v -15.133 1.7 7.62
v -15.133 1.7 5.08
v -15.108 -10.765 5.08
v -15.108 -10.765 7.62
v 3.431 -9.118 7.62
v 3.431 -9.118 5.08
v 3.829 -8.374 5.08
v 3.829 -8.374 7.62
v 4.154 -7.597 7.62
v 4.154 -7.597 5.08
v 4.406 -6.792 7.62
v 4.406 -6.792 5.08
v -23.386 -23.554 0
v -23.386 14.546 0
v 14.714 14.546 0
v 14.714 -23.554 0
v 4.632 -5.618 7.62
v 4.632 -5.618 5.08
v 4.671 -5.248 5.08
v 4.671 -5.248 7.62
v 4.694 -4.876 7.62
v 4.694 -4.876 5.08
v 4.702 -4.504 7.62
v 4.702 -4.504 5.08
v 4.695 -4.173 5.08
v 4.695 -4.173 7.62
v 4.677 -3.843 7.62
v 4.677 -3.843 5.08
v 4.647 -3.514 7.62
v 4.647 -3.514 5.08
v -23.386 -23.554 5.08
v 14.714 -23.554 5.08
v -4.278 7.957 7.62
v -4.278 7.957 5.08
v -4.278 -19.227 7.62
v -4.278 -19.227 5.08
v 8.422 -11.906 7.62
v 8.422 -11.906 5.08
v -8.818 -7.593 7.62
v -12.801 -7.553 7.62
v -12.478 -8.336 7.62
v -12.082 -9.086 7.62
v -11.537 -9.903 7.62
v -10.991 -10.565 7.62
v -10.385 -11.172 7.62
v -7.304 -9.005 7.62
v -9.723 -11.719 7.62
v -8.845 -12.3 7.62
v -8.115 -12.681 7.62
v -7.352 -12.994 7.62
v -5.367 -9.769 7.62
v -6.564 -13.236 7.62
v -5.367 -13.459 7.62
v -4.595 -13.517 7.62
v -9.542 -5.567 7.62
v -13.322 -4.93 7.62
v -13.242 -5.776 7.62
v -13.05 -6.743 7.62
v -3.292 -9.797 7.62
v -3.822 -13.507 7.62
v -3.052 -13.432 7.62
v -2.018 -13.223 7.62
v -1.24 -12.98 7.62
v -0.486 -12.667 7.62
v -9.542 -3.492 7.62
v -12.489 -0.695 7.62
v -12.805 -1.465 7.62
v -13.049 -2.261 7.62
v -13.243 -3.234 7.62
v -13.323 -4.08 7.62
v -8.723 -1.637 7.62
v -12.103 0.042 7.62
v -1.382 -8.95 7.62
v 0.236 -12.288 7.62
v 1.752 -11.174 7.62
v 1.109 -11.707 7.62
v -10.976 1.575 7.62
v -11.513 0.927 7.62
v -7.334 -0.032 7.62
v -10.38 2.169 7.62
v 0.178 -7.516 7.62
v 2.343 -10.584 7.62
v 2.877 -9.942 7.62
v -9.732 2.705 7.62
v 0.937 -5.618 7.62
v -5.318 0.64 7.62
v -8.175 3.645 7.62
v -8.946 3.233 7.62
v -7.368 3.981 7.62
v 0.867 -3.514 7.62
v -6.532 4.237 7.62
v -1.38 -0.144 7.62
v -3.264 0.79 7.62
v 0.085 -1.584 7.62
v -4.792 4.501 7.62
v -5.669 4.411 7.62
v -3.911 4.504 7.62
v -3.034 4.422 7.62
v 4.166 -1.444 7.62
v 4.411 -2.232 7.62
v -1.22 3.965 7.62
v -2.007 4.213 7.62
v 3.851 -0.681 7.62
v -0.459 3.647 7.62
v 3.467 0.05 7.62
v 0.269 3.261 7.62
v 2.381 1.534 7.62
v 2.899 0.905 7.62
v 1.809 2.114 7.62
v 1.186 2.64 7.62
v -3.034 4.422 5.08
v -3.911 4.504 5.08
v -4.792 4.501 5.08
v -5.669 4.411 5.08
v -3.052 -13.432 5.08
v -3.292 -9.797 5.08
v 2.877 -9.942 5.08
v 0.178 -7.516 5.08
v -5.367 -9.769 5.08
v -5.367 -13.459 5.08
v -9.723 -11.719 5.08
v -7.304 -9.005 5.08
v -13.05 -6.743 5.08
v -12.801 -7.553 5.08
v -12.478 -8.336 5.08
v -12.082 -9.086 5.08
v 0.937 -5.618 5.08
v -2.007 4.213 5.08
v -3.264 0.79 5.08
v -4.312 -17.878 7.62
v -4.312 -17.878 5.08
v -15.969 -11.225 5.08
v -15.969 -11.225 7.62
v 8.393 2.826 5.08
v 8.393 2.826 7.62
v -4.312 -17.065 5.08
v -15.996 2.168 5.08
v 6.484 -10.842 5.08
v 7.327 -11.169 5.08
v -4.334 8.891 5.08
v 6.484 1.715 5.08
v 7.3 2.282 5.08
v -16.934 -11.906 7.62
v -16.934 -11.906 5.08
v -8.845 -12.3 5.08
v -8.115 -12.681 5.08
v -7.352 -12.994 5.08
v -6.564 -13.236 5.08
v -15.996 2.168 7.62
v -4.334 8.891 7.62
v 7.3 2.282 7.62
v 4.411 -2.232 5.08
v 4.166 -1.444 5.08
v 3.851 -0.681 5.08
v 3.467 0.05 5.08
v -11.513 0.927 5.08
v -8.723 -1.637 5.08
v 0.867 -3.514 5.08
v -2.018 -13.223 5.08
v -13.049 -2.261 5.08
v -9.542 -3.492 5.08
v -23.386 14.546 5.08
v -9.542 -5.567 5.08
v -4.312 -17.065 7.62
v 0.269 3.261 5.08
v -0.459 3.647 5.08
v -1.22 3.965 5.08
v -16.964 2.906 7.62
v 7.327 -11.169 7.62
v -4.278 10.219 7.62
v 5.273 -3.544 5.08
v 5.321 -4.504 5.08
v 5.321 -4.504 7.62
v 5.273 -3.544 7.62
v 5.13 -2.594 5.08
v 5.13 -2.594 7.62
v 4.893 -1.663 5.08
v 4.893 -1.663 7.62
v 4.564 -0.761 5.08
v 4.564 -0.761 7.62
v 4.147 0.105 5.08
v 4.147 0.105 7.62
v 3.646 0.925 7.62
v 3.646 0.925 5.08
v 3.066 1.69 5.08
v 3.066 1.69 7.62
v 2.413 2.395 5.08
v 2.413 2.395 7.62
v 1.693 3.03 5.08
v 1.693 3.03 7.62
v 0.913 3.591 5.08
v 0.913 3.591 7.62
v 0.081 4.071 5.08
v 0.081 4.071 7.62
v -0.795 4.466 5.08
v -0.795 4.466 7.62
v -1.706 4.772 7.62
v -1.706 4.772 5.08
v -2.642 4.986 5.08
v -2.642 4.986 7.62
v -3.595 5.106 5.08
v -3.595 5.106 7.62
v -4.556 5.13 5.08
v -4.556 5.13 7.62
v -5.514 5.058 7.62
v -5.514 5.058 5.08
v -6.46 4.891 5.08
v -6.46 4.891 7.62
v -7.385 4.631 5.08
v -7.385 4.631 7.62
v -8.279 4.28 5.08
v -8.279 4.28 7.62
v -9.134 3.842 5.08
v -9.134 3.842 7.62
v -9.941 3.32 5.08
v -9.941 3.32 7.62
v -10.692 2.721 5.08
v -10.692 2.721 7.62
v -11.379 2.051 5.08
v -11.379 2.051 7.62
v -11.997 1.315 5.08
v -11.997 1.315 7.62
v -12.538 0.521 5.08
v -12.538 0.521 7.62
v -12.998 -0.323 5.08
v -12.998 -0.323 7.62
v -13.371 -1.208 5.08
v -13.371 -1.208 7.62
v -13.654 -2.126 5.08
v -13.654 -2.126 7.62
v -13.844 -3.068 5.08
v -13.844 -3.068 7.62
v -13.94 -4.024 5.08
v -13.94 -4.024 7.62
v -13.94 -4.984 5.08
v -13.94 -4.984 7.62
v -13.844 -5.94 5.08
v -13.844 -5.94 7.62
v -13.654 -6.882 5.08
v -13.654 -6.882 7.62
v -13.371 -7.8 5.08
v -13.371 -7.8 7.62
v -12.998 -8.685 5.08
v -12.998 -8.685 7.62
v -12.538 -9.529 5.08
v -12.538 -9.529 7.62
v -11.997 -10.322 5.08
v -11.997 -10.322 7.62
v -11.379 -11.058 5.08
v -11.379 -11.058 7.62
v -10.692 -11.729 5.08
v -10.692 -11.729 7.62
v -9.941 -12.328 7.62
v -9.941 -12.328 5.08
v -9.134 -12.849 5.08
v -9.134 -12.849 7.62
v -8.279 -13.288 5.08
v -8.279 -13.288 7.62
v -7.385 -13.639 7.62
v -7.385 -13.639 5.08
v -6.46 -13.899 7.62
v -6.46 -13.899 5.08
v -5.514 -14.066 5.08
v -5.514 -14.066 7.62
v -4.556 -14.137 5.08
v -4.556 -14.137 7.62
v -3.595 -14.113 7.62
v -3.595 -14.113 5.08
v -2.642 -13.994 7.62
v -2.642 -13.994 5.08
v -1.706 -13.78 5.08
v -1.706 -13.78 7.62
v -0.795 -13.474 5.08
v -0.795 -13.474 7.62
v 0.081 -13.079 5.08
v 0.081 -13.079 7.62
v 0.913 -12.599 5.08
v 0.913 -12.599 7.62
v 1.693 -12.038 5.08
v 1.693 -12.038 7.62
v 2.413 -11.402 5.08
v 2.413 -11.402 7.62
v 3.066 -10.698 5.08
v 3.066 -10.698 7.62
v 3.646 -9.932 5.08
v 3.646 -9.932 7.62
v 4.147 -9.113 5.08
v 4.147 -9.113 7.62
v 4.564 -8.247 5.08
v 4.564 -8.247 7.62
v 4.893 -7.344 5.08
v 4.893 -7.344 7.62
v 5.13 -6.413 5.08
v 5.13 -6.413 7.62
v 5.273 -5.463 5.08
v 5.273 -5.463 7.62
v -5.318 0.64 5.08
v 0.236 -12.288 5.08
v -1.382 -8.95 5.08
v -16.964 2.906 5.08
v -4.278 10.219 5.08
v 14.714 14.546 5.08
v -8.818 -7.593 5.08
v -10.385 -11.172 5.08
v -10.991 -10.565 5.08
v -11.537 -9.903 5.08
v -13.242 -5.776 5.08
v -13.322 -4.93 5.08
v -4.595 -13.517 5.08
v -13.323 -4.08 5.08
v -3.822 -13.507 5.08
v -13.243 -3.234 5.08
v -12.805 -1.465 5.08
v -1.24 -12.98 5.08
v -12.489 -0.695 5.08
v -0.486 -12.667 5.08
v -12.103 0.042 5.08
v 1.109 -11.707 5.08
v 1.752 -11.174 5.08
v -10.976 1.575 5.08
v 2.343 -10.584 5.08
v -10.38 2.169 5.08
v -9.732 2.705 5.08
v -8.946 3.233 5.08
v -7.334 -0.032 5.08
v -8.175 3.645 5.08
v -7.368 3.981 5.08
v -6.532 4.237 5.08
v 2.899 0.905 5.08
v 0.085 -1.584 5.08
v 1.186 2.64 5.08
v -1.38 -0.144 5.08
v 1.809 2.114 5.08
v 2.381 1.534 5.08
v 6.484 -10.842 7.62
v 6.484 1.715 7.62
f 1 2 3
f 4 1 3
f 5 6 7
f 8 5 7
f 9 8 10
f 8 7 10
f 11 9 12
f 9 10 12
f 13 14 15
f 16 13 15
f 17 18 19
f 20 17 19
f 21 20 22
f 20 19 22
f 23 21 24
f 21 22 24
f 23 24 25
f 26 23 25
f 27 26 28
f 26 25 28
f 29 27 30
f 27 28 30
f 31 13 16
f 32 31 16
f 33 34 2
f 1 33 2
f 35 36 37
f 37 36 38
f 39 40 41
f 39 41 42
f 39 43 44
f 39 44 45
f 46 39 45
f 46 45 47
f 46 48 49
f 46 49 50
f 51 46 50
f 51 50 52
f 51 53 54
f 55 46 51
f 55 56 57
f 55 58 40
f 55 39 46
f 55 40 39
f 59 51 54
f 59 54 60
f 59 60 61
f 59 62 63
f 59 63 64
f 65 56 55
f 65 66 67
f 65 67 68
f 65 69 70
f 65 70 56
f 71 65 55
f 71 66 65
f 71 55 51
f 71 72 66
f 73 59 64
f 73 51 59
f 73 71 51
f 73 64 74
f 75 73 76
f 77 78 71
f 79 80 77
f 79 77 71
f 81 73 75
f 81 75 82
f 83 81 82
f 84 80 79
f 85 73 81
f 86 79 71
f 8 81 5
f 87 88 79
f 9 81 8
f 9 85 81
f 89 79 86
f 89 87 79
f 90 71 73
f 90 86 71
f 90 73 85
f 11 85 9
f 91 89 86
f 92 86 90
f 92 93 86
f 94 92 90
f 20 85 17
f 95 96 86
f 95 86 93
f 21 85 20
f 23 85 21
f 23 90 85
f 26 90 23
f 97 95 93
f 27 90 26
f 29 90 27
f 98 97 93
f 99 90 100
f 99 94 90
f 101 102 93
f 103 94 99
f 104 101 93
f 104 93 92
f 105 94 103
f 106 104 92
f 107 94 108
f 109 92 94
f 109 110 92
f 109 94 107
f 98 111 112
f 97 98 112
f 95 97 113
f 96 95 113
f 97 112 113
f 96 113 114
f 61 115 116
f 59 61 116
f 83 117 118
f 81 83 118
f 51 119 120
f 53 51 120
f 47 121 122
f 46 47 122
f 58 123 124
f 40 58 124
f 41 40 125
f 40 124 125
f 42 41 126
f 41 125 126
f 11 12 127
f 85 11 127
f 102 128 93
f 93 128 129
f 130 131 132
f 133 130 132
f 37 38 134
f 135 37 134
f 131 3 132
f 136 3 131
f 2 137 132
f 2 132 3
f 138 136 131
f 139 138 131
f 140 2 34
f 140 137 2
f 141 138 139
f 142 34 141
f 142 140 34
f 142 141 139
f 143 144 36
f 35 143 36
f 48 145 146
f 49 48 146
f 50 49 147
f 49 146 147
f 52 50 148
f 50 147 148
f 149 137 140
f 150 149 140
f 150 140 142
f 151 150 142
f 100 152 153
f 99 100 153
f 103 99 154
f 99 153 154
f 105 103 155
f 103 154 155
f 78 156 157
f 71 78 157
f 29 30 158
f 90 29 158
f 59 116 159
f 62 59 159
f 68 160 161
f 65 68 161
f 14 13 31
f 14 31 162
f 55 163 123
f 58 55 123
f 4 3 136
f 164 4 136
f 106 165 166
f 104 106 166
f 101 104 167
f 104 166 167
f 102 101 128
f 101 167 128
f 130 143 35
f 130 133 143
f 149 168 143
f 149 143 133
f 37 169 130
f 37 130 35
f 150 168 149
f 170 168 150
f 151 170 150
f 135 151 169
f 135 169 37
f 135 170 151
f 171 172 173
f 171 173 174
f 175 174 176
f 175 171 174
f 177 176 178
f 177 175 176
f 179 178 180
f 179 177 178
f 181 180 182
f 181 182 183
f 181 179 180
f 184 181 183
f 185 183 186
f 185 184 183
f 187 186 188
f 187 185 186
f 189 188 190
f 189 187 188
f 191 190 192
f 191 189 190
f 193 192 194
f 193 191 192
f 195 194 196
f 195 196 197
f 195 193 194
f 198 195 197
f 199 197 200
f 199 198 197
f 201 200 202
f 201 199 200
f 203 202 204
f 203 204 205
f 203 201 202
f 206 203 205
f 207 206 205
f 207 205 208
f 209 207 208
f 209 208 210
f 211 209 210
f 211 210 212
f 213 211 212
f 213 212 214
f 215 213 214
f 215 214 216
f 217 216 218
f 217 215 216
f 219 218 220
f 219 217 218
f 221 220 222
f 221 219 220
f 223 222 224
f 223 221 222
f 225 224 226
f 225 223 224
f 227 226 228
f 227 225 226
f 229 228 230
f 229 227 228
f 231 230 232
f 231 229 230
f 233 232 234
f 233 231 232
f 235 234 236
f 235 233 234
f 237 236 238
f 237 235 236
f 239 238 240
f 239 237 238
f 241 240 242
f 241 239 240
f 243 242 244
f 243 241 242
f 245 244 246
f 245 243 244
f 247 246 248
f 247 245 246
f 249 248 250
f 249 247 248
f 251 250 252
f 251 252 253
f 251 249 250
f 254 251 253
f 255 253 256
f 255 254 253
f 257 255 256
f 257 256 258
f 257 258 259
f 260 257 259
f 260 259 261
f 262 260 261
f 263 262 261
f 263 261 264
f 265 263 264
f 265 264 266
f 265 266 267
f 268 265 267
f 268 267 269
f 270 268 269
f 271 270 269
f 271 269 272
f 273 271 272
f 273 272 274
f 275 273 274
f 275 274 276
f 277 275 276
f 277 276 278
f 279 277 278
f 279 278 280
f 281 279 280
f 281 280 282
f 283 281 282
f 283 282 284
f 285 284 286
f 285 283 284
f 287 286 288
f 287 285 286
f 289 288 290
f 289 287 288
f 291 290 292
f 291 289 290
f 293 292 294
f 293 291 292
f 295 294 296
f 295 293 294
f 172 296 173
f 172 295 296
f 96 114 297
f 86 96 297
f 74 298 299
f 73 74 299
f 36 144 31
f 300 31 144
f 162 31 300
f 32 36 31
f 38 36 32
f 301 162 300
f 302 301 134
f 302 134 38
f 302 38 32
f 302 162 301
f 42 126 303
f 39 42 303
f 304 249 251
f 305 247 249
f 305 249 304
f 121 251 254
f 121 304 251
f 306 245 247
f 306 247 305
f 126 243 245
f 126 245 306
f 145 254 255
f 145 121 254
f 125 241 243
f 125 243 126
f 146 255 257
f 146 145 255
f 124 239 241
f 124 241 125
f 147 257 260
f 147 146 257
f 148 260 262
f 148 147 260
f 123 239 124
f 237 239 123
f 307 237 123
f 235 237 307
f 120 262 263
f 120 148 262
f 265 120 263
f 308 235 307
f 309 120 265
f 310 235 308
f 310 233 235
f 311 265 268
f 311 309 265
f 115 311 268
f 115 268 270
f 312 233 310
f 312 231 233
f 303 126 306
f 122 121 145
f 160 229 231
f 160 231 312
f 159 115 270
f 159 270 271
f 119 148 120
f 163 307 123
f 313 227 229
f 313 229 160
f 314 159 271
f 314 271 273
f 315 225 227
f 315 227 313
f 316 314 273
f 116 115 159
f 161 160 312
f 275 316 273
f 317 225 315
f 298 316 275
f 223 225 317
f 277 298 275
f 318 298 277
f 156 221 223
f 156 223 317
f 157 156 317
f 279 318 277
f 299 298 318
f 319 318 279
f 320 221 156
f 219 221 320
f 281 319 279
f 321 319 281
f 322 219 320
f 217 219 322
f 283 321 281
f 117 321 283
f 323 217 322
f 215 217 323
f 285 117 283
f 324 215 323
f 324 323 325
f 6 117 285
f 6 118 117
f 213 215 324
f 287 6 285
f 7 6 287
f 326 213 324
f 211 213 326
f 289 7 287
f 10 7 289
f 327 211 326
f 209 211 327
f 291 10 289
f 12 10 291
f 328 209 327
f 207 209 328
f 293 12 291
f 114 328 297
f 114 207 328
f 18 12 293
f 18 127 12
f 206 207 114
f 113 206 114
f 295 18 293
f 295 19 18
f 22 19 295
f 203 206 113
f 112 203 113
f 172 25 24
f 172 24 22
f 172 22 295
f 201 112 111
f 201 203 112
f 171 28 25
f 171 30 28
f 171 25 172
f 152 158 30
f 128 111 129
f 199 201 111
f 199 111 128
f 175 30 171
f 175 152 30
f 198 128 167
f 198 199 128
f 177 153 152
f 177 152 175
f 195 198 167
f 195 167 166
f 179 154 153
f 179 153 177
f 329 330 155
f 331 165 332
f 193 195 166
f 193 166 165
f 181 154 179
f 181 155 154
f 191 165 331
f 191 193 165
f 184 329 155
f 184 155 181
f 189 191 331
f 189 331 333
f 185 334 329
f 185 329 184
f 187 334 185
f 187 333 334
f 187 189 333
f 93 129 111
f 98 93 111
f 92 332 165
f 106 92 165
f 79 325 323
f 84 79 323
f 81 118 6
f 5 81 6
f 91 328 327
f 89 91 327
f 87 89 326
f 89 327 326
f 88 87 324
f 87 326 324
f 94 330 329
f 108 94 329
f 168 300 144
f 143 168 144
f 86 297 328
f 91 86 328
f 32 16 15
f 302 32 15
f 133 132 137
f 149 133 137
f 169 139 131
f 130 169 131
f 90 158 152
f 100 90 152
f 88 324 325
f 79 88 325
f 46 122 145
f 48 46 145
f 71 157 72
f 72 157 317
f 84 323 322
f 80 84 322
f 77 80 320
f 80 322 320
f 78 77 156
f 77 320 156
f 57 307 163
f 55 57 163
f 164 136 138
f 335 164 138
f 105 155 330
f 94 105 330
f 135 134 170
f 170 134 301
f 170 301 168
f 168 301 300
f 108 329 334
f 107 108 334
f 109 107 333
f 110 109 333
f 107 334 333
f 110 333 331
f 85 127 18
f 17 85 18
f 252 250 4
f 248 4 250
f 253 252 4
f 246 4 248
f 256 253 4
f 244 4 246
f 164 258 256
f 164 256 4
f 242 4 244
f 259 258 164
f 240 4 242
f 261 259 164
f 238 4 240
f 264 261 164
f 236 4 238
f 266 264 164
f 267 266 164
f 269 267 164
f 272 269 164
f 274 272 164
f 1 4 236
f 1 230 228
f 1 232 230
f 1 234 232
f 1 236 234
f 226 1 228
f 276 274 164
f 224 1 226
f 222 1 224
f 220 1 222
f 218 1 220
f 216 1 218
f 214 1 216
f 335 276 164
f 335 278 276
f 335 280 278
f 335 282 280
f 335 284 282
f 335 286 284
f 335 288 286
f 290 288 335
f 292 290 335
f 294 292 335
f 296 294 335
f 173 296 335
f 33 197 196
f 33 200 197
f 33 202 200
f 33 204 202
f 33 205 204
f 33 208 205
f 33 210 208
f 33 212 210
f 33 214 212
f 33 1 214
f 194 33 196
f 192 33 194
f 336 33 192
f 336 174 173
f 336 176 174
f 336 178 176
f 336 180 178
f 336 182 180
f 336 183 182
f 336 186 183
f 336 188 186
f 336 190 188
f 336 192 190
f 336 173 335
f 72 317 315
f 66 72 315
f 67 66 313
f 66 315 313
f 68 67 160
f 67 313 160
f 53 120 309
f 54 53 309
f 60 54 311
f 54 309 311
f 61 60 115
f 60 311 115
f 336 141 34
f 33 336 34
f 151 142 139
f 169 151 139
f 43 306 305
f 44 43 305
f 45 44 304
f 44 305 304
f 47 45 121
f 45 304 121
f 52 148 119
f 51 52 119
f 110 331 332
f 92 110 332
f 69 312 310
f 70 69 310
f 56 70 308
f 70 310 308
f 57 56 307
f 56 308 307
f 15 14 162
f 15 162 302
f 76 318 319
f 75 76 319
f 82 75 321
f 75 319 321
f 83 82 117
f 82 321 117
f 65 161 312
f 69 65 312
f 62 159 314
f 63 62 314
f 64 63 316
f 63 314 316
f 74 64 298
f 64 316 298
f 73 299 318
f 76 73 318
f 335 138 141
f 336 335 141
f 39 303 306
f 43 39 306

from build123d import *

# Parameters (mm, degrees)
F0_W     = 38.1
F0_H     = 38.1
F1_DEPTH = 5.08
F2_R     = 9.636419
F3_DEPTH = 2.54


with BuildPart() as f1:
    # F0 (on Top) → F1 (new body)
    with BuildSketch(Plane.XY):
        with Locations((-4.336205, -4.503883)):
            Rectangle(F0_W, F0_H)
    extrude(amount=F1_DEPTH)

    # F2 (on face) → F3 (join)
    with BuildSketch(Plane.XY.offset(5.08)):
        Polygon((-16.963584, 2.906272), (-16.933717, -11.906166), (-4.27773, -19.227108), (8.422415, -11.905848), (8.392711, 2.825718), (-4.27773, 10.219293), align=None)
        Polygon((-4.311768, -17.878222), (-15.968911, -11.225127), (-15.995917, 2.168256), (-4.333854, 8.891092), (7.299944, 2.28216), (7.327066, -11.168777), align=None, mode=Mode.SUBTRACT)
        Polygon((-15.133053, 1.699716), (-15.107919, -10.765341), (-4.311768, -17.065212), (6.484382, -10.841549), (6.484382, 1.714627), (-4.27773, 7.95749), align=None)
        with Locations((-4.31549, -4.503883)):
            Circle(F2_R, mode=Mode.SUBTRACT)
        with BuildLine():
            ThreePointArc((4.6324, -5.61813), (4.684216, -5.062077), (4.70151, -4.503883))
            ThreePointArc((4.70151, -4.503883), (4.687865, -4.008002), (4.646969, -3.513622))
            Line((4.646969, -3.513622), (0.866868, -3.513622))
            Line((0.866868, -3.513622), (4.410669, -2.232224))
            ThreePointArc((4.410669, -2.232224), (4.017353, -1.058594), (3.467016, 0.050114))
            Line((3.467016, 0.050114), (0.085442, -1.584476))
            Line((0.085442, -1.584476), (2.899253, 0.904792))
            ThreePointArc((2.899253, 0.904792), (2.101629, 1.830694), (1.186131, 2.640237))
            Line((1.186131, 2.640237), (-1.379733, -0.143722))
            Line((-1.379733, -0.143722), (0.269269, 3.26054))
            ThreePointArc((0.269269, 3.26054), (-0.836167, 3.814806), (-2.007042, 4.212616))
            Line((-2.007042, 4.212616), (-3.264274, 0.789716))
            Line((-3.264274, 0.789716), (-3.033893, 4.421574))
            ThreePointArc((-3.033893, 4.421574), (-4.351626, 4.513044), (-5.668584, 4.411016))
            Line((-5.668584, 4.411016), (-5.317712, 0.640375))
            Line((-5.317712, 0.640375), (-6.531781, 4.236502))
            ThreePointArc((-6.531781, 4.236502), (-7.775625, 3.822806), (-8.946344, 3.233137))
            Line((-8.946344, 3.233137), (-7.333815, -0.031659))
            Line((-7.333815, -0.031659), (-9.731831, 2.705106))
            ThreePointArc((-9.731831, 2.705106), (-10.684924, 1.878639), (-11.513346, 0.927245))
            Line((-11.513346, 0.927245), (-8.723363, -1.636518))
            Line((-8.723363, -1.636518), (-12.102514, 0.042383))
            ThreePointArc((-12.102514, 0.042383), (-12.655716, -1.076506), (-13.049107, -2.261068))
            Line((-13.049107, -2.261068), (-9.542109, -3.492343))
            Line((-9.542109, -3.492343), (-13.242584, -3.233735))
            ThreePointArc((-13.242584, -3.233735), (-13.33249, -4.504989), (-13.242272, -5.776221))
            Line((-13.242272, -5.776221), (-9.542109, -5.566502))
            Line((-9.542109, -5.566502), (-13.049957, -6.743385))
            ThreePointArc((-13.049957, -6.743385), (-12.648551, -7.948644), (-12.08175, -9.08553))
            Line((-12.08175, -9.08553), (-8.817994, -7.592915))
            Line((-8.817994, -7.592915), (-11.537476, -9.902884))
            ThreePointArc((-11.537476, -9.902884), (-10.695368, -10.875967), (-9.723315, -11.719264))
            Line((-9.723315, -11.719264), (-7.304202, -9.005236))
            Line((-7.304202, -9.005236), (-8.845366, -12.300454))
            ThreePointArc((-8.845366, -12.300454), (-7.737035, -12.846504), (-6.564463, -13.235917))
            Line((-6.564463, -13.235917), (-5.366502, -9.769401))
            Line((-5.366502, -9.769401), (-5.366502, -13.459421))
            ThreePointArc((-5.366502, -13.459421), (-4.208192, -13.520245), (-3.051657, -13.431874))
            Line((-3.051657, -13.431874), (-3.292344, -9.796692))
            Line((-3.292344, -9.796692), (-2.018305, -13.223358))
            ThreePointArc((-2.018305, -13.223358), (-0.859311, -12.832215), (0.23608, -12.287809))
            Line((0.23608, -12.287809), (-1.38217, -8.949596))
            Line((-1.38217, -8.949596), (1.108565, -11.707071))
            ThreePointArc((1.108565, -11.707071), (2.054256, -10.886095), (2.87708, -9.94201))
            Line((2.87708, -9.94201), (0.178137, -7.5158))
            Line((0.178137, -7.5158), (3.43137, -9.118257))
            ThreePointArc((3.43137, -9.118257), (4.000591, -7.989439), (4.406341, -6.792104))
            Line((4.406341, -6.792104), (0.937204, -5.61813))
            Line((0.937204, -5.61813), (4.6324, -5.61813))
        make_face()
    extrude(amount=F3_DEPTH)


solid = f1.part
